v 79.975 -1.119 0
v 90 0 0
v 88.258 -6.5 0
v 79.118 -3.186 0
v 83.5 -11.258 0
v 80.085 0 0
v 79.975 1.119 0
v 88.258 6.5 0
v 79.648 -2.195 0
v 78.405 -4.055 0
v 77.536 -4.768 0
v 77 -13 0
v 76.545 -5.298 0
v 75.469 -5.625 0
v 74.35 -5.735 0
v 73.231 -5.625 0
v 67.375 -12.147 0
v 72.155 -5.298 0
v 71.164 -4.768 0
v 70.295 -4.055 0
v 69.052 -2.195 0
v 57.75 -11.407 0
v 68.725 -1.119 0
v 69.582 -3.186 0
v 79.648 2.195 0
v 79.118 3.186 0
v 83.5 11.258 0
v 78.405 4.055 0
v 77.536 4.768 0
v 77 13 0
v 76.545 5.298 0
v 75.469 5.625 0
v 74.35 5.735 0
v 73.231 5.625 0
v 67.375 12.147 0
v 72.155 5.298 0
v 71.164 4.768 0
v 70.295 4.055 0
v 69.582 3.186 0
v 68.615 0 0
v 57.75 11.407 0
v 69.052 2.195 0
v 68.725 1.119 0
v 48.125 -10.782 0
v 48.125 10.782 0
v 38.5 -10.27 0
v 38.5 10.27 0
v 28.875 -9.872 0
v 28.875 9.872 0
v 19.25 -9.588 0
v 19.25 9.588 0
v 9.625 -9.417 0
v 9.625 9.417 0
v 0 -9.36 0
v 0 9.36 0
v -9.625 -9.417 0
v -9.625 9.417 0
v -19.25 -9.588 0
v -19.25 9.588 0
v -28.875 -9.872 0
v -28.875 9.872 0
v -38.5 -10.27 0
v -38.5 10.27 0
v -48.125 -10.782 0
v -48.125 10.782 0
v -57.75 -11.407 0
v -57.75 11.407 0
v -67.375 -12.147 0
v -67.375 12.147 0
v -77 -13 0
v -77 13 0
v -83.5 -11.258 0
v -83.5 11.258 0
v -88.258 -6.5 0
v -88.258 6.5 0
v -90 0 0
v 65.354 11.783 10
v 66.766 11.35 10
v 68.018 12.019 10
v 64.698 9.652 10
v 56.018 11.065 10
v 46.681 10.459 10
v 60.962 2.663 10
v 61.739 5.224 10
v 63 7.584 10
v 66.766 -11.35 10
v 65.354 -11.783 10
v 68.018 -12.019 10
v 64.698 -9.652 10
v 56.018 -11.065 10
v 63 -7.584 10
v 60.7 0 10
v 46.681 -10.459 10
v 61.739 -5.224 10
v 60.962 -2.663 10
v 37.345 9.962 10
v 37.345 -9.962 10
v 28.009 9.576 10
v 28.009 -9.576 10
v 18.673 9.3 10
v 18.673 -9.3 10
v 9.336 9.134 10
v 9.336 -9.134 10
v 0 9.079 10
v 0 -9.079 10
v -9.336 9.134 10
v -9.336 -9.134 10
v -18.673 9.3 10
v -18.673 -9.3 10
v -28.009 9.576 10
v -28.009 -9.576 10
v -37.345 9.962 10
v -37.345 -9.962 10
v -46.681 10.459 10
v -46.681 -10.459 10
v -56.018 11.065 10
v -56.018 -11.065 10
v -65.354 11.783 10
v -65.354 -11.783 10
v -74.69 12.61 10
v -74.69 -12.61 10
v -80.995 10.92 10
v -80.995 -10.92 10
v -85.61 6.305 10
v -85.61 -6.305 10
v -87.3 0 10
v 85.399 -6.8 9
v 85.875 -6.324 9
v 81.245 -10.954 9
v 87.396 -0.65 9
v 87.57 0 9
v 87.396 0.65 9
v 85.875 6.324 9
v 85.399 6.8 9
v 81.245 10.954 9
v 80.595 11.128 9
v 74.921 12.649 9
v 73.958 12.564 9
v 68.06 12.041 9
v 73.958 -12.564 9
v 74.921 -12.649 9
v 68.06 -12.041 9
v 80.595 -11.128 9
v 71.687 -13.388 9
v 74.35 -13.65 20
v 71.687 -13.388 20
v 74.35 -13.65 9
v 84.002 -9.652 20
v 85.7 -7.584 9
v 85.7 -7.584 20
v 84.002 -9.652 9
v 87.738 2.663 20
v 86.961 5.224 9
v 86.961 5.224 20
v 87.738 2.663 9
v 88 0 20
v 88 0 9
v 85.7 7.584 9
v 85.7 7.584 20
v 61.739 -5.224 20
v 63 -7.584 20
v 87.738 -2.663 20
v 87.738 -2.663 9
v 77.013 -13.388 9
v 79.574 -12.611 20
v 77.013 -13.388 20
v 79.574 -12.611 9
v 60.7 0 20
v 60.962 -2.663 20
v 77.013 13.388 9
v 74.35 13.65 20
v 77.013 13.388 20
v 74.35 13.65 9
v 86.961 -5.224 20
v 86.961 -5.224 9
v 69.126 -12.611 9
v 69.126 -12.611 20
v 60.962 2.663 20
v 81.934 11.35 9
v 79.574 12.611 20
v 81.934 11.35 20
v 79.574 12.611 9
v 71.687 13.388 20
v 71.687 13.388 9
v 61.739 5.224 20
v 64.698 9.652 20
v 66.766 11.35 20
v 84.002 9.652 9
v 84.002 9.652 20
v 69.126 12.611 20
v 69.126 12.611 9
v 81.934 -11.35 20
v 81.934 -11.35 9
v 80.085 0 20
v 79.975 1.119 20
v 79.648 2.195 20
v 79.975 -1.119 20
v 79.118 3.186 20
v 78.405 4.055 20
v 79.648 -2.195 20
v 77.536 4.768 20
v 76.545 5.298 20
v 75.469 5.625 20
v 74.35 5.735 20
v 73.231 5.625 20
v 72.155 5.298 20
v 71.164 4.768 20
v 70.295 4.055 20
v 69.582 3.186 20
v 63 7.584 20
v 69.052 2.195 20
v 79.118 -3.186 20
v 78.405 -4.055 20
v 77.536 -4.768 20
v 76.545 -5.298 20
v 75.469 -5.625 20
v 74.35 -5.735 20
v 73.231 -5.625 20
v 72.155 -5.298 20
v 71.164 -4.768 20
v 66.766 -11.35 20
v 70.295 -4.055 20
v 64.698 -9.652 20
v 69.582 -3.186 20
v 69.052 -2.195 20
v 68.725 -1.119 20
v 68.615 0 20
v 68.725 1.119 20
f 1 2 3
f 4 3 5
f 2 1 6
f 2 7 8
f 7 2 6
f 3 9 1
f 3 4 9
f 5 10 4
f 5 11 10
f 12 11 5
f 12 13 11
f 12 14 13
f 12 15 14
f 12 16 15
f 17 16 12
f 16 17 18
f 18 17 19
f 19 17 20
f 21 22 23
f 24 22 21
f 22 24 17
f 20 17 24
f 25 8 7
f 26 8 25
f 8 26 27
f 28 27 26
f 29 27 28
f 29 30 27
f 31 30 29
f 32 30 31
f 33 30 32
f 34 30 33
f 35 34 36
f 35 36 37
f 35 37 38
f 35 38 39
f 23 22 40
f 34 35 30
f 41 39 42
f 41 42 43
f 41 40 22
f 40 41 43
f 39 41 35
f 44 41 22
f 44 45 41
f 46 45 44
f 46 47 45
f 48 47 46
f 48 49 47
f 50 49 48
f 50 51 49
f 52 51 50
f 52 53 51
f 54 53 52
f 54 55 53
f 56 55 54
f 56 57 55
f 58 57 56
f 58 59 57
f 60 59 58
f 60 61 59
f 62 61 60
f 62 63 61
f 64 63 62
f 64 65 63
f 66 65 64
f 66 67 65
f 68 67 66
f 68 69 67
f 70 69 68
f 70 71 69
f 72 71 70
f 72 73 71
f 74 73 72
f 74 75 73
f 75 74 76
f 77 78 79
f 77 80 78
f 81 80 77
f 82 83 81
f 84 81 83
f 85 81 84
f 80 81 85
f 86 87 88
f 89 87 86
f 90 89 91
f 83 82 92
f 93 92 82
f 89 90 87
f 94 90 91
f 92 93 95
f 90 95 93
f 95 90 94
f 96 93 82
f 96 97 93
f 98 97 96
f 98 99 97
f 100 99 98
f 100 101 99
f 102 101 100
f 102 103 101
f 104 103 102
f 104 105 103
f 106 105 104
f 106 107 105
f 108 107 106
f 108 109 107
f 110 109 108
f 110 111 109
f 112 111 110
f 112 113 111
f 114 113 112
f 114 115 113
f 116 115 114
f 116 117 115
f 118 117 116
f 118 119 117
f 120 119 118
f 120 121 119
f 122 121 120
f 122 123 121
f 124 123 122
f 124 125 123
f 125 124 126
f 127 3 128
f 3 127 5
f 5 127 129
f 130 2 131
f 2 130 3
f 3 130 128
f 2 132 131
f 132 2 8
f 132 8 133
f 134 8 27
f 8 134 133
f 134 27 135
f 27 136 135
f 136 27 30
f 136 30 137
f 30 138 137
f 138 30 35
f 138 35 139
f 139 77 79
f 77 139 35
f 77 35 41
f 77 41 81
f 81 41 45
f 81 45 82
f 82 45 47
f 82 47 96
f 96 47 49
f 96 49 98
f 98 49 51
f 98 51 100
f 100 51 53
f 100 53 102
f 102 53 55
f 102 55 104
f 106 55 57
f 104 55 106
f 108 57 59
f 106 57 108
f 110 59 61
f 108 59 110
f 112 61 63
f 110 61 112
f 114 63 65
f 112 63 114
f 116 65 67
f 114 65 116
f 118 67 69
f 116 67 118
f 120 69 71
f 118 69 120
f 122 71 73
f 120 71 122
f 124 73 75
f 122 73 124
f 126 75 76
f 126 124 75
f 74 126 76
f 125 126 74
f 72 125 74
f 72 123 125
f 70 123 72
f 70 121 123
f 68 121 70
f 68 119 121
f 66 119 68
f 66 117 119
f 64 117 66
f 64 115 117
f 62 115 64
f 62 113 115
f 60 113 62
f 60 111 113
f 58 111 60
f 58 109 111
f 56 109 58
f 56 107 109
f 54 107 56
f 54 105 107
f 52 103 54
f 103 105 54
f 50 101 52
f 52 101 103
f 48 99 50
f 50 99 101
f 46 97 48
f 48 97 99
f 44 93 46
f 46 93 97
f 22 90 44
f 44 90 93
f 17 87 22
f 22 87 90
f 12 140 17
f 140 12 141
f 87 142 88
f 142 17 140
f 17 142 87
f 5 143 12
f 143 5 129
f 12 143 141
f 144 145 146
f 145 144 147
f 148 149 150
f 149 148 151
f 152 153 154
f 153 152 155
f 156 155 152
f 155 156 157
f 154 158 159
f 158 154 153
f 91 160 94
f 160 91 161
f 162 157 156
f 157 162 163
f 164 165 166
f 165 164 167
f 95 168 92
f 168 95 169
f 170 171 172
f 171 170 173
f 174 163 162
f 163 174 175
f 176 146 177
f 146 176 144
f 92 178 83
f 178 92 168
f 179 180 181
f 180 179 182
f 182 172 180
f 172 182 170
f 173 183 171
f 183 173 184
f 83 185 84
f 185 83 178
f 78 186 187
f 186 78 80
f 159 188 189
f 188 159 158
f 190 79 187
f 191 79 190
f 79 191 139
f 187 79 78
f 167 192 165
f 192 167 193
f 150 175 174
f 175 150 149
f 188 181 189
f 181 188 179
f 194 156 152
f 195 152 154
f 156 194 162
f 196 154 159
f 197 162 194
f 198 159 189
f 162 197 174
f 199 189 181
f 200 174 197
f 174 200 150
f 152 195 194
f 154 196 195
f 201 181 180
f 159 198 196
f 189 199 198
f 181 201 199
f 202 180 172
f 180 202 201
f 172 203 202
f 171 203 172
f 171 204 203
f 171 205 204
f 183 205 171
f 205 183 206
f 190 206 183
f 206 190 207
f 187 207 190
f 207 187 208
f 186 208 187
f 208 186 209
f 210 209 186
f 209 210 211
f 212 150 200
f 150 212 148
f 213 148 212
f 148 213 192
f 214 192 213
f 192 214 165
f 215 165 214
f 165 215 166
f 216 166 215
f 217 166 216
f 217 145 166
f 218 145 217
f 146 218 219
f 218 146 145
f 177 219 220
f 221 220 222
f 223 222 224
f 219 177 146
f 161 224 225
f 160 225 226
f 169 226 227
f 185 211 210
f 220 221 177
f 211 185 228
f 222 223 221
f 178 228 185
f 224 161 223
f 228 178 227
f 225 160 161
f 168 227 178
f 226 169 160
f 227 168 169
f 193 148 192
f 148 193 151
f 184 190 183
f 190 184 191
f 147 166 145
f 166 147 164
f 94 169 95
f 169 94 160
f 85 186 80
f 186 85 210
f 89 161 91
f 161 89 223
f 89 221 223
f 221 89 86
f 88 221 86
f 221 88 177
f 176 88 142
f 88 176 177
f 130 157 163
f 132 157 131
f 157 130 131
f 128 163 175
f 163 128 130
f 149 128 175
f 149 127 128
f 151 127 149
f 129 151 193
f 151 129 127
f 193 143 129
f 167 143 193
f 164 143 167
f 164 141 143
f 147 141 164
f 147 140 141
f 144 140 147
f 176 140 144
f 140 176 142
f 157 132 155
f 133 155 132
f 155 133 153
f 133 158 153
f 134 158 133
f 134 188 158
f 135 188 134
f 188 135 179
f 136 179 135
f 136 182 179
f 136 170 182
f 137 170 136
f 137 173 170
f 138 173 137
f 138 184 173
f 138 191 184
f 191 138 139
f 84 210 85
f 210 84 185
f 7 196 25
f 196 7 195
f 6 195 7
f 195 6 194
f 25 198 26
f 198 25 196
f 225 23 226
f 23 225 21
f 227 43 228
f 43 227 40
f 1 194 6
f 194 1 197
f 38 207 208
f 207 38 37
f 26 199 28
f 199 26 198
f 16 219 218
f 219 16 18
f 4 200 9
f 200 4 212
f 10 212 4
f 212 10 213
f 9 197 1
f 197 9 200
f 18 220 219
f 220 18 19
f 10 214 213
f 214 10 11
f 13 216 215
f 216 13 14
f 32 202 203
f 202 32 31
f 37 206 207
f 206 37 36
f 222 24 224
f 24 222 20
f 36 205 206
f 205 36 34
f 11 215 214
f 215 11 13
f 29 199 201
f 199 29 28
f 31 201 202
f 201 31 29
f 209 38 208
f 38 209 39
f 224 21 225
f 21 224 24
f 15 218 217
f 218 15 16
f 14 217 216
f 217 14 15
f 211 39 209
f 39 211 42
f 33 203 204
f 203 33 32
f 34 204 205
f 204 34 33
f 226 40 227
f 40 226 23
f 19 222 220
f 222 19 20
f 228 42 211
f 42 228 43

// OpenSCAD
$fn = 32;

// ----------------------------------------------------------------------
// Handle: 180 x 26 mm grip, 10 mm thick
// ----------------------------------------------------------------------

// --- parameters (mm) ---
length = 180;             // grip length
width = 26;               // grip width
thickness = 10;           // grip thickness
waist = 0.72;             // width factor at the middle
draft = 0.97;             // top face scale of the extrusion
boss_d = 27.3;            // mounting boss diameter
boss_h = 10;              // mounting boss height
boss_hole_d = 11.47;      // screw clearance through the boss
boss_r = 74.35;           // boss centre from the grip centre

/* ergonomic grip outline, closed spline-like polygon in the XY plane */
grip = [[-77, 13], [-67.375, 12.147], [-57.75, 11.407], [-48.125, 10.782], [-38.5, 10.27], [-28.875, 9.872], [-19.25, 9.588], [-9.625, 9.417], [0, 9.36], [9.625, 9.417], [19.25, 9.588], [28.875, 9.872], [38.5, 10.27], [48.125, 10.782], [57.75, 11.407], [67.375, 12.147], [77, 13], [83.5, 11.258], [88.258, 6.5], [90, 0], [88.258, -6.5], [83.5, -11.258], [77, -13], [77, -13], [67.375, -12.147], [57.75, -11.407], [48.125, -10.782], [38.5, -10.27], [28.875, -9.872], [19.25, -9.588], [9.625, -9.417], [0, -9.36], [-9.625, -9.417], [-19.25, -9.588], [-28.875, -9.872], [-38.5, -10.27], [-48.125, -10.782], [-57.75, -11.407], [-67.375, -12.147], [-77, -13], [-83.5, -11.258], [-88.258, -6.5], [-90, 0], [-88.258, 6.5], [-83.5, 11.258], [-77, 13]];

module grip_body() {
  linear_extrude(height = thickness, scale = draft) polygon(grip);
}

module boss_body() {
  /* sunk 1 mm into the grip so the joint overlaps */
  translate([boss_r, 0, thickness - 1]) cylinder(h = boss_h + 1, d = boss_d);
}

difference() {
  union() {
    grip_body();
    boss_body();
  }
  translate([boss_r, 0, -1]) cylinder(h = thickness + boss_h + 2, d = boss_hole_d);
}
